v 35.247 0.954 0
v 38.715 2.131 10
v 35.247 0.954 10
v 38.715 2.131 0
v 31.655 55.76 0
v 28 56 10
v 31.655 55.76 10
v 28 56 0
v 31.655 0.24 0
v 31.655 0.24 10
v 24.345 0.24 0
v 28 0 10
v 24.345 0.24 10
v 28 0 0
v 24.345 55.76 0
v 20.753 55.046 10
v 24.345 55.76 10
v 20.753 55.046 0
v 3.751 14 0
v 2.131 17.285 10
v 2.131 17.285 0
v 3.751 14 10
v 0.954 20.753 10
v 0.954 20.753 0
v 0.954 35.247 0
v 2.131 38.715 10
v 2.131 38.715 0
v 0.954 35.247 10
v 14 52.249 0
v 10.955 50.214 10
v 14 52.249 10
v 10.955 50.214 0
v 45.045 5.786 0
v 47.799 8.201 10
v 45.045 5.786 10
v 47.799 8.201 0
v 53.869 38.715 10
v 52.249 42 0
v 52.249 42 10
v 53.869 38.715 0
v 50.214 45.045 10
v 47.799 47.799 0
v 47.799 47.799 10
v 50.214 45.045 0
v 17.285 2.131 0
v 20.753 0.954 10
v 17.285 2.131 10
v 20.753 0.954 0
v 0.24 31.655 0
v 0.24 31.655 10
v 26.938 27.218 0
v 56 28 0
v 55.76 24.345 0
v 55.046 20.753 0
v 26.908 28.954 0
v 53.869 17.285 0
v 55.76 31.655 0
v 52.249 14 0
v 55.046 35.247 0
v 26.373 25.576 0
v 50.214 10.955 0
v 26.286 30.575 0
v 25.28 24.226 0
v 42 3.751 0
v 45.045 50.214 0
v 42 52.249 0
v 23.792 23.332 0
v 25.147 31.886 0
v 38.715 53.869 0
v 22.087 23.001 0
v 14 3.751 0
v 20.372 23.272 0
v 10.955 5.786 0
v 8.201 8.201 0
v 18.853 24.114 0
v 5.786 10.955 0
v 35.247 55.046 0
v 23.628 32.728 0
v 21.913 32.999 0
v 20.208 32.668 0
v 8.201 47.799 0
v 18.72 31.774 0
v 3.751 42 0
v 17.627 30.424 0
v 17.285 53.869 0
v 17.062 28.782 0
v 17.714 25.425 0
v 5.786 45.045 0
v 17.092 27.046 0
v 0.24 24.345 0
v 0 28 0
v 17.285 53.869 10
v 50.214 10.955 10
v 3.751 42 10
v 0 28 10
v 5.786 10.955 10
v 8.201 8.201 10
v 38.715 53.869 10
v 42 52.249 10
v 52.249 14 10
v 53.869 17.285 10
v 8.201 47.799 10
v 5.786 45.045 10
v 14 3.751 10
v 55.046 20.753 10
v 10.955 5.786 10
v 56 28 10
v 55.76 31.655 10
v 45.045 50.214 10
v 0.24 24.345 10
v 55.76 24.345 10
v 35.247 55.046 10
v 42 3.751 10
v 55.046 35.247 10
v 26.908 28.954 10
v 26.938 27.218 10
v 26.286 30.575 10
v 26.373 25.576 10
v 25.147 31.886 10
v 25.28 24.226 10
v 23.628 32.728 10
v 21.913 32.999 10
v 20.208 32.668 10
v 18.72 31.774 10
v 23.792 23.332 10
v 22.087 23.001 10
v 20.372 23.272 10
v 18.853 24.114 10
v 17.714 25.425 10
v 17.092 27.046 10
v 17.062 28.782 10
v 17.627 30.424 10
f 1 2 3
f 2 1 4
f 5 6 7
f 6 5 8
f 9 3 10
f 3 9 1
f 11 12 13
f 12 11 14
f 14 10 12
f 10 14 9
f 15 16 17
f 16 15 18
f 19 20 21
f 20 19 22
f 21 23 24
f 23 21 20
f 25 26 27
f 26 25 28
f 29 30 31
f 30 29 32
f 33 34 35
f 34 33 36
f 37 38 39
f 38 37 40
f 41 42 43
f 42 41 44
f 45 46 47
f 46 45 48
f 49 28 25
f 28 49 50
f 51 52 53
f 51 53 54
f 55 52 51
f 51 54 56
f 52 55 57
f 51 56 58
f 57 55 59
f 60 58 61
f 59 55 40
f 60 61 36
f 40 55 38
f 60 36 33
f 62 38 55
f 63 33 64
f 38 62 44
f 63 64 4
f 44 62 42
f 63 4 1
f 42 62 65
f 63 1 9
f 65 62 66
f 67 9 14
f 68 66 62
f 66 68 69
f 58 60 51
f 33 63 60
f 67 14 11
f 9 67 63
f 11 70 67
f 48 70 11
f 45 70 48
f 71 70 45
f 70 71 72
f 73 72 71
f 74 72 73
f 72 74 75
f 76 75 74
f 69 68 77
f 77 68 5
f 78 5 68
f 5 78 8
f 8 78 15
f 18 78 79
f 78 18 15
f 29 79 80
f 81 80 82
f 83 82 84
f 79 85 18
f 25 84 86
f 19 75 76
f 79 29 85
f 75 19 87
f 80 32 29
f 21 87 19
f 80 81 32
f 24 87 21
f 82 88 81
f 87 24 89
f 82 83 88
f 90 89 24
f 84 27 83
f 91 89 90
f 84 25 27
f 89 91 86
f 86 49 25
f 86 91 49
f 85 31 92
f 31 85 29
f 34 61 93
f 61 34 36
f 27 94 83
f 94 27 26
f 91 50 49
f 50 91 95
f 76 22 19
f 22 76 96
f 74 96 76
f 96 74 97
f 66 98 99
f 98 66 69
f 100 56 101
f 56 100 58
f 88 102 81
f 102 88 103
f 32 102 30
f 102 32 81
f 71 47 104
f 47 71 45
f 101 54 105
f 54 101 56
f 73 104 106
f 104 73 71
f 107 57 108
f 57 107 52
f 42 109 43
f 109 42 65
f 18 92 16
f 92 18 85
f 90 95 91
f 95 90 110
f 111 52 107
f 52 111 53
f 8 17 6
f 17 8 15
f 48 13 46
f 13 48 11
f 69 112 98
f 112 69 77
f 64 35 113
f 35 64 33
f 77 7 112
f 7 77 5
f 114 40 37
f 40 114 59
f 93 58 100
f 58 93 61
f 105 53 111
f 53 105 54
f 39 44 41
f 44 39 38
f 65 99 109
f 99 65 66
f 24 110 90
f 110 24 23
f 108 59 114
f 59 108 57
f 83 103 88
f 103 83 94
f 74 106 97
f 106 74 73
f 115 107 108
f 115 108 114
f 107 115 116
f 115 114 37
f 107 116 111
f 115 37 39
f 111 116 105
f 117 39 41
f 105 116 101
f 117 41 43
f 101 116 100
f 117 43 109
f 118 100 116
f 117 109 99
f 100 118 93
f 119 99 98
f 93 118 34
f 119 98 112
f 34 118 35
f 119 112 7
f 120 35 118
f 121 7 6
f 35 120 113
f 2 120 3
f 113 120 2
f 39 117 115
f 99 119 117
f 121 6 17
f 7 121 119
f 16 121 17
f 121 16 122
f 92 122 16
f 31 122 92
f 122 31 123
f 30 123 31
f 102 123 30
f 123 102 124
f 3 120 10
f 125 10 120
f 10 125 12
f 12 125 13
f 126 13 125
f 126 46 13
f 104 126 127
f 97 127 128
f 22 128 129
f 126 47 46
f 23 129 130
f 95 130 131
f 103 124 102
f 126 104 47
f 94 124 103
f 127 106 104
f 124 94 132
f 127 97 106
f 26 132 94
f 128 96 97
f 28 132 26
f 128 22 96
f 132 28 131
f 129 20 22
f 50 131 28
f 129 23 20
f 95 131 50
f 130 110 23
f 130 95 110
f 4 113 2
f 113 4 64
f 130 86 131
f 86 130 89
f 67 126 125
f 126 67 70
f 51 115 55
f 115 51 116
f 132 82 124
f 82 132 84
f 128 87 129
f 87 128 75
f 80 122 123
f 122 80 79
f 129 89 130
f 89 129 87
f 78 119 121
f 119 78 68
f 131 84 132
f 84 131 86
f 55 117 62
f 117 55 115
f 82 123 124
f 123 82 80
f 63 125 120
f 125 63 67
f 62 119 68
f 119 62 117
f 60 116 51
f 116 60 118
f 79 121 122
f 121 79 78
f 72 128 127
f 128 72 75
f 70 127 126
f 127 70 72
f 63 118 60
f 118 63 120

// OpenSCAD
$fn = 32;

// ----------------------------------------------------------------------
// Cam plate: eccentric cam, base R28
// ----------------------------------------------------------------------

// --- parameters (mm) ---
base_r = 28;              // base circle radius
lobe_h = 8;               // cam lobe rise
bore_r = 5;               // shaft bore radius
plate_t = 10;             // plate thickness, Z (extrusion height)
ecc = 6;                  // disc eccentricity

profile = [[56, 28], [55.76, 31.655], [55.046, 35.247], [53.869, 38.715], [52.249, 42], [50.214, 45.045], [47.799, 47.799], [45.045, 50.214], [42, 52.249], [38.715, 53.869], [35.247, 55.046], [31.655, 55.76], [28, 56], [24.345, 55.76], [20.753, 55.046], [17.285, 53.869], [14, 52.249], [10.955, 50.214], [8.201, 47.799], [5.786, 45.045], [3.751, 42], [2.131, 38.715], [0.954, 35.247], [0.24, 31.655], [0, 28], [0.24, 24.345], [0.954, 20.753], [2.131, 17.285], [3.751, 14], [5.786, 10.955], [8.201, 8.201], [10.955, 5.786], [14, 3.751], [17.285, 2.131], [20.753, 0.954], [24.345, 0.24], [28, 0], [31.655, 0.24], [35.247, 0.954], [38.715, 2.131], [42, 3.751], [45.045, 5.786], [47.799, 8.201], [50.214, 10.955], [52.249, 14], [53.869, 17.285], [55.046, 20.753], [55.76, 24.345]];  // primary outline, 48 points, counter clockwise
void_1 = [[26.908, 28.954], [26.286, 30.575], [25.147, 31.886], [23.628, 32.728], [21.913, 32.999], [20.208, 32.668], [18.72, 31.774], [17.627, 30.424], [17.062, 28.782], [17.092, 27.046], [17.714, 25.425], [18.853, 24.114], [20.372, 23.272], [22.087, 23.001], [23.792, 23.332], [25.28, 24.226], [26.373, 25.576], [26.938, 27.218]];  // shaft bore, 18 points

// --- the one profile operation ---
difference() {
  linear_extrude(height = plate_t) polygon(points = profile);
  translate([0, 0, -1])
    linear_extrude(height = plate_t + 2) polygon(points = void_1);
}
